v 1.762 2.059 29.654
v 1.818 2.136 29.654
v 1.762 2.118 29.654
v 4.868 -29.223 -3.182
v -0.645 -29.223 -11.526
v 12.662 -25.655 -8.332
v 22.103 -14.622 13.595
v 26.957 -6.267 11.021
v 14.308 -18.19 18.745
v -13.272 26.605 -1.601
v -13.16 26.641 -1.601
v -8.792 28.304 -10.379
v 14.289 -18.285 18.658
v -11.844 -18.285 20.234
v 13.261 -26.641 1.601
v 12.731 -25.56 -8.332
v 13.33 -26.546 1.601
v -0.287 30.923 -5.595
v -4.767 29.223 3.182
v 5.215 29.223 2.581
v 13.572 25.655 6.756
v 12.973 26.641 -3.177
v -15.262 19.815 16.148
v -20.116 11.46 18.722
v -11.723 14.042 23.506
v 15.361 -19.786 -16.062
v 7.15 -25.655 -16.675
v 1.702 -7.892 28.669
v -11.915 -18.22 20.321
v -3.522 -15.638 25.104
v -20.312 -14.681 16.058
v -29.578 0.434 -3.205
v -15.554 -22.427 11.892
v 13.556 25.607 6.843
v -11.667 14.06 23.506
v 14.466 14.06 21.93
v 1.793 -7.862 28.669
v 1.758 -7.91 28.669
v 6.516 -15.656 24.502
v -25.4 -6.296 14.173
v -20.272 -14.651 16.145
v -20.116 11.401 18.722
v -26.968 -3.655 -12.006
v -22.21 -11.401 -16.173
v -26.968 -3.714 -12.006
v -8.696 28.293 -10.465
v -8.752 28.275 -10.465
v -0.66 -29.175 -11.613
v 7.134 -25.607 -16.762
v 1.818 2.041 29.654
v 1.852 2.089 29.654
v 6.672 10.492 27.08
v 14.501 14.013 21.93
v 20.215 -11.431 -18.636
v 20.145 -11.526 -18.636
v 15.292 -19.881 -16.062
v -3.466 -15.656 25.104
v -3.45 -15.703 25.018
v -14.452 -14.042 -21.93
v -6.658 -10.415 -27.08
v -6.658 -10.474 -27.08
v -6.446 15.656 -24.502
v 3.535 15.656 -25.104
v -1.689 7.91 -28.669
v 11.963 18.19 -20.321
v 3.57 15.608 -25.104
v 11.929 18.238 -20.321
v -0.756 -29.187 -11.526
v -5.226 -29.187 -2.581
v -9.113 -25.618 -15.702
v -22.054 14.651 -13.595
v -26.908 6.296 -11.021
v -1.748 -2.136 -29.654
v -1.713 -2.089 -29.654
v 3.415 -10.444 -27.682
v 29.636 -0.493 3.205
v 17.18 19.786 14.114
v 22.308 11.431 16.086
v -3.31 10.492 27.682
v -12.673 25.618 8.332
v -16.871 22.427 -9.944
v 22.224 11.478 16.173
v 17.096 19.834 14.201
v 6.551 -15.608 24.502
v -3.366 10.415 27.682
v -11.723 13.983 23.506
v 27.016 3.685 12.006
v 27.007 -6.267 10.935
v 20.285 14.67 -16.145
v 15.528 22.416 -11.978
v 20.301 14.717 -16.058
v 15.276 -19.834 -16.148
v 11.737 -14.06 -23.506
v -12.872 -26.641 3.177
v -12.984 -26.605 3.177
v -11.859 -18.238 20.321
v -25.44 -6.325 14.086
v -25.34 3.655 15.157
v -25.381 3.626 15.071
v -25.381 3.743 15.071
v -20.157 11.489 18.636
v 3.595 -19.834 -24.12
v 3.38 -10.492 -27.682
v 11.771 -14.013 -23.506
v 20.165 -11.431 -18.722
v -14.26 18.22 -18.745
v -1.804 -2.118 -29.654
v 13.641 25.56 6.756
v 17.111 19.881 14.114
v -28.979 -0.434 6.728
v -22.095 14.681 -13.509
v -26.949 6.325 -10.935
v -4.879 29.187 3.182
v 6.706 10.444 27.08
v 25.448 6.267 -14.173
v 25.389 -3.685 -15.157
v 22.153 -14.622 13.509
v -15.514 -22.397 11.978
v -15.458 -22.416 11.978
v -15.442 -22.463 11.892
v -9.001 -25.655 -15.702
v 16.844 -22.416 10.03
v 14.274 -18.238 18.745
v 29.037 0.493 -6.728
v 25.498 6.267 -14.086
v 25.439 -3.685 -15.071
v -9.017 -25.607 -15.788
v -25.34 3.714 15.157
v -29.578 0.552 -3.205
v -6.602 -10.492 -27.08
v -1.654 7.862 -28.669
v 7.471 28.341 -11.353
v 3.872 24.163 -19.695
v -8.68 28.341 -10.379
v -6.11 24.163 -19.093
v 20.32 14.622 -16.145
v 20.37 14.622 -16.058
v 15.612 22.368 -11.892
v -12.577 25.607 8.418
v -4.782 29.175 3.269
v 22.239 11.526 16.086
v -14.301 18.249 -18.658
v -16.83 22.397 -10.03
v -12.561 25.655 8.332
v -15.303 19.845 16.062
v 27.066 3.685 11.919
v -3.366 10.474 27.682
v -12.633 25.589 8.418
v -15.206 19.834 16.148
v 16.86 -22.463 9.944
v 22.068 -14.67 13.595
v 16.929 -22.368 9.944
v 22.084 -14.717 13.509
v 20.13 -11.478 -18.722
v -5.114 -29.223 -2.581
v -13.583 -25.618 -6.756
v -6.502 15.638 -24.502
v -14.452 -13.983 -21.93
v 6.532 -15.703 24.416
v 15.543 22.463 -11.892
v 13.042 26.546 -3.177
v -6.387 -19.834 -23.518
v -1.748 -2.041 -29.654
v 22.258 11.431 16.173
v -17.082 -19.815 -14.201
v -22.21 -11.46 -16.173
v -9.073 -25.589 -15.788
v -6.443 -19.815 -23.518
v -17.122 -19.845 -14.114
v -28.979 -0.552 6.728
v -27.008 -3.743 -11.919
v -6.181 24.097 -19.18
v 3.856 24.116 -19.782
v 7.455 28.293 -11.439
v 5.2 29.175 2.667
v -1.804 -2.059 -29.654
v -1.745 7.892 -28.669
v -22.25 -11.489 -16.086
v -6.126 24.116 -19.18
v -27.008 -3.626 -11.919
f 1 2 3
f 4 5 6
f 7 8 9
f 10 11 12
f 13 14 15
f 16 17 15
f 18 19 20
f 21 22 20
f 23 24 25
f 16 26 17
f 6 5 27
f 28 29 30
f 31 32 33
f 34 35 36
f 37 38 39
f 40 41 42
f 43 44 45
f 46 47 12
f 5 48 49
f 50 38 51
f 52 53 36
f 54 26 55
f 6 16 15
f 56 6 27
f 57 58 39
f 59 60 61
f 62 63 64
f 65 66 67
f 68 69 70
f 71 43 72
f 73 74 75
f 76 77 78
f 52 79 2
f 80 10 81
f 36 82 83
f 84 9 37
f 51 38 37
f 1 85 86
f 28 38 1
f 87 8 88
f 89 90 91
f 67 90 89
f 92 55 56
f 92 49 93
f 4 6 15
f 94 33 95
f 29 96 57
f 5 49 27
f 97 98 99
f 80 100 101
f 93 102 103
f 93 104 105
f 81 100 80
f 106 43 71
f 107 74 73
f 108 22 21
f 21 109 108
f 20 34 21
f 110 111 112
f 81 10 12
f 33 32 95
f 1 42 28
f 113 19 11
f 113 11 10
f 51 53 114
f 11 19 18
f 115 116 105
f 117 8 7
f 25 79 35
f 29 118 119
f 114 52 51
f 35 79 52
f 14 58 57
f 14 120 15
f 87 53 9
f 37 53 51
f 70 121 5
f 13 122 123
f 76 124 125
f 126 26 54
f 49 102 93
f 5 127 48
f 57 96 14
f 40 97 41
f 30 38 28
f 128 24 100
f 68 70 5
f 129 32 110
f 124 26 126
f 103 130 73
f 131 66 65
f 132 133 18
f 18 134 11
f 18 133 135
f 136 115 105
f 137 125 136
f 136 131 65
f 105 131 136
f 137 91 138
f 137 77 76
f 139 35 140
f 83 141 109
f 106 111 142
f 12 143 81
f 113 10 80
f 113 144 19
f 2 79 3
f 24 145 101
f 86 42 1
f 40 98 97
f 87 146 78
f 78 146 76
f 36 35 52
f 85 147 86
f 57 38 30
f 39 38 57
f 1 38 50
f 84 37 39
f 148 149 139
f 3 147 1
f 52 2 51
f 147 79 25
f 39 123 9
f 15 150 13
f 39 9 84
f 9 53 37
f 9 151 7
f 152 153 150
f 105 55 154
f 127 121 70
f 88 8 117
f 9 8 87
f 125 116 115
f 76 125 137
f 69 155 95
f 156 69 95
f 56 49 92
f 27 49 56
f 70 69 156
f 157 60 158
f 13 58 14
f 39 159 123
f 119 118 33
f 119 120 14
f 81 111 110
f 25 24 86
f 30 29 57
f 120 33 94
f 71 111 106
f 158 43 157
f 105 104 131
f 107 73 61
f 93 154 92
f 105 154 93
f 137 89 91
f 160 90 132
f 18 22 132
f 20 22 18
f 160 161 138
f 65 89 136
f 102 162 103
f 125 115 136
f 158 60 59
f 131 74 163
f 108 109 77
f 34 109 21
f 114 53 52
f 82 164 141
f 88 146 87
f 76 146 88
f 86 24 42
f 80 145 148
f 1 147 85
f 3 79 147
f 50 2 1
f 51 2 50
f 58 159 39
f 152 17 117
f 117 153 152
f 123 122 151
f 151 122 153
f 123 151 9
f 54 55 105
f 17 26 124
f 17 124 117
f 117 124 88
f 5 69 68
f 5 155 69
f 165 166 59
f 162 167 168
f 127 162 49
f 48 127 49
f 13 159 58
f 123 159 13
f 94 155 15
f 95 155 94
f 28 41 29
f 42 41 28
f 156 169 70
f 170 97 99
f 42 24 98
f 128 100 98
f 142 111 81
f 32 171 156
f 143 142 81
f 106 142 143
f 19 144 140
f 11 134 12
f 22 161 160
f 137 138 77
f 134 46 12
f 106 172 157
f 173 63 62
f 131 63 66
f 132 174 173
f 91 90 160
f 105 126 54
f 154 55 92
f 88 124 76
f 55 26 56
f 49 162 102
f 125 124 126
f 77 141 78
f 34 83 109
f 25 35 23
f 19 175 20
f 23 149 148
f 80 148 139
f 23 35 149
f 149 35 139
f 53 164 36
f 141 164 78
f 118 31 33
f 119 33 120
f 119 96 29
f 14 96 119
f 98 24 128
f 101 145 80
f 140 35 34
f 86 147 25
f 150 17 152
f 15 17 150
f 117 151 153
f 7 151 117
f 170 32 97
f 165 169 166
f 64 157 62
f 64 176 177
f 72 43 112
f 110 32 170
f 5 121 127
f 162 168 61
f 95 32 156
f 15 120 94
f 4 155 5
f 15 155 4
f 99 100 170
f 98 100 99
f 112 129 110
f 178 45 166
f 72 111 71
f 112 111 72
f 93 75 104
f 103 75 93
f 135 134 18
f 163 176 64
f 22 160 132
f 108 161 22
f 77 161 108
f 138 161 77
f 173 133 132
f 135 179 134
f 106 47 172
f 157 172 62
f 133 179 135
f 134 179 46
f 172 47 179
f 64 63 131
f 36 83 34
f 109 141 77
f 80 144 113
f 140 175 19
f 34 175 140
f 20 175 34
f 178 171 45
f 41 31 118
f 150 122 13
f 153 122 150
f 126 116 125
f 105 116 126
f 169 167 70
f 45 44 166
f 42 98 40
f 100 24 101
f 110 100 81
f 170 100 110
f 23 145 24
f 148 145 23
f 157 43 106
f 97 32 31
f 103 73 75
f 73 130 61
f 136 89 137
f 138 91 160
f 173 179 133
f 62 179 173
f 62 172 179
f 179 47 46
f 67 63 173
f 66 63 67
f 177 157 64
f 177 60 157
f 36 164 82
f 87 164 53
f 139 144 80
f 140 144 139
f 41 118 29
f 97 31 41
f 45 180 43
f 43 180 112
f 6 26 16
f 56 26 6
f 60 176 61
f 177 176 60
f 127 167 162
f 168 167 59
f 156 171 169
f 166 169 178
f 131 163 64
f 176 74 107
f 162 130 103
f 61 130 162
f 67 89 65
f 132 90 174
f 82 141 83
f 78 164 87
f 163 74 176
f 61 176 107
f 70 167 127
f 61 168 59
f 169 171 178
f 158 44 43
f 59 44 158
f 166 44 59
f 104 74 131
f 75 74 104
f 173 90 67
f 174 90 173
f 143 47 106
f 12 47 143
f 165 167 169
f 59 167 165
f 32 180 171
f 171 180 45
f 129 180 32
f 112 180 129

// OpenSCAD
// Auto-generated OpenSCAD file

    inner_points = 10*[[-0.17041080214674126, 0.7862375594247885, -2.8582778861302787], [0.1802309286658651, 0.2088872902636722, 2.9567222750529307], [-0.17634695174386278, -0.20888728923371336, -2.9567222750529307], [0.17429477906874358, -0.7862375583948297, 2.8582778861302787], [-2.9497504156068732, 0.04931160049722948, -0.3204805387029167], [-2.889853657259625, -0.04931159952382933, 0.6728400755788456], [2.893737634181627, 0.04931160055378816, -0.6728400755788456], [2.9536343925288753, -0.04931159946727065, 0.3204805387029167], [-0.47977606233285736, 2.9127811671079766, 0.3182468427064288], [-0.5145268873613189, -2.9127811660876786, -0.25805664805191697], [0.5184108642833212, 2.912781167117638, 0.25805664805191697], [0.48366003925485973, -2.9127811660780174, -0.3182468427064288], [-0.6461927033123381, 1.5608342286633365, -2.4415866544877143], [-0.3325692049742699, 1.044436449194514, 2.7595076053434417], [-0.6617337447199062, -1.0444364481742165, -2.69931741068893], [-0.3481102463818381, -1.5608342276430391, 2.501776849142226], [0.35199422330384045, 1.560834228672998, -2.501776849142226], [0.6656177216419085, 1.0444364492041753, 2.69931741068893], [0.33645318189627227, -1.0444364481645552, -2.7595076053434417], [0.6500766802343404, -1.5608342276333778, 2.4415866544877143], [-2.6867831123319075, 0.6266618696861422, -1.0934713951014787], [-2.5299713631628737, 0.3684629799517309, 1.5070757348140993], [-2.692719261929029, -0.3684629789723597, -1.1919157840241308], [-2.5359075127599953, -0.6266618687067711, 1.4086313458914472], [2.5397914896819973, 0.6266618697367299, -1.4086313458914472], [2.696603238851031, 0.3684629800023185, 1.1919157840241308], [2.533855340084876, -0.3684629789217721, -1.5070757348140993], [2.6906670892539095, -0.6266618686561835, 1.0934713951014787], [-1.3191089998085306, 2.654582277350415, -0.16013956324217252], [-1.2592122414612827, 2.5559590773293563, 0.8331810510395898], [-1.3501910826236672, -2.555959076324691, -0.6756010756446058], [-1.2902943242764193, -2.6545822763457494, 0.31771953863715663], [1.2941783011984218, 2.6545822773757086, -0.31771953863715663], [1.3540750595456696, 2.5559590773546503, 0.6756010756446058], [1.2630962183832852, -2.555959076299397, -0.8331810510395898], [1.322992976730533, -2.654582276320456, 0.16013956324217252], [-1.4219601402274384, 1.8190331184052655, -1.8658104677986405], [-1.1682334002366181, 1.4012585389575019, 2.341963177750754], [-1.4411699238483318, -1.4012585379528368, -2.1843832023557694], [-1.1874431838575115, -1.8190331174006005, 2.0233904431936245], [1.191327160779514, 1.8190331184305593, -2.0233904431936245], [1.4450539007703342, 1.4012585389827956, 2.1843832023557694], [1.1721173771586206, -1.401258537927543, -2.341963177750754], [1.425844117149441, -1.8190331173753067, 1.8658104677986405], [-2.201396319355864, 1.4622110286266452, -1.350876259465479], [-2.0075663377122916, 1.1430596491999403, 1.8635767718021523], [-2.216937360763432, -1.1430596482109077, -1.6086070156666958], [-2.02310737911986, -1.4622110276376128, 1.6058460156009355], [2.026991356041862, 1.4622110286675716, -1.6058460156009355], [2.220821337685434, 1.1430596492408664, 1.6086070156666958], [2.0114503146342937, -1.1430596481699815, -1.8635767718021523], [2.205280296277866, -1.4622110275966864, 1.350876259465479], [-1.6789912939052822, 2.236807697874855, -0.9943752224774262], [-1.5221795447362483, 1.9786088081404438, 1.606171907438152], [-1.704137227123297, -1.9786088071417498, -1.411392345957207], [-1.5473254779542631, -2.2368076968761605, 1.189154783958371], [1.5512094548762656, 2.2368076979061198, -1.189154783958371], [1.7080212040452996, 1.9786088081717086, 1.411392345957207], [1.5260635216582508, -1.978608807110485, -1.606171907438152], [1.6828752708272847, -2.2368076968448958, 0.9943752224774262], [-0.8711277587214085, 2.8245698953316367, -1.0378735875155352], [-0.9032238569451155, -2.5559590763240982, -1.5701514091469855], [0.7439726156693655, 2.8245698953472695, -1.1352633682560076], [0.7118765174456584, -2.555959076308466, -1.667541189887458], [-0.6140966050435644, 2.4067953158620474, -1.9093088328367496], [-0.6402565536701501, -1.9786088071351857, -2.343142265545548], [0.38409032157261397, 2.406795315871709, -1.9694990274912612], [0.35793037294602836, -1.9786088071255243, -2.4033324602000596], [-0.03179482124573489, 3.0827687850891983, -0.5594871815669338], [-0.06755966168276713, -2.9127811660870866, -1.1526069815542968]];

    outer_points = 10*[[0.02669300107192015, 2.6559559407120075, -1.327709675532447], [-0.042901108049307975, -2.064522788314904, 2.1339007964918846], [0.042901108049307975, 2.064522788314904, -2.1339007964918846], [-0.02669300107192015, -2.6559559407120075, 1.327709675532447], [-2.9205155693857976, 0.40317701641016973, -0.35449197483984196], [-2.932403662473765, -0.40317701641016973, 0.2368216872694541], [2.932403662473765, 0.40317701641016973, -0.2368216872694541], [2.9205155693857976, -0.40317701641016973, 0.35449197483984196], [-0.5473409378859402, 1.731154990176565, 2.349712270792537], [-0.4524570269604289, -1.731154990176565, -2.3698127555891437], [0.4524570269604289, 1.731154990176565, 2.3698127555891437], [0.5473409378859402, -1.731154990176565, -2.349712270792537], [-0.4899922381375115, 2.885258312413753, -0.5028116297625187], [-0.5522391016689532, -1.3368662173646406, 2.593346901066097], [-0.4475588631774159, 1.3368662173646406, -2.613447385862704], [-0.5098057267088576, -2.885258312413753, 0.48271114496591183], [0.5098057267088576, 2.885258312413753, -0.48271114496591183], [0.4475588631774159, -1.3368662173646406, 2.613447385862704], [0.5522391016689532, 1.3368662173646406, -2.593346901066097], [0.4899922381375115, -2.885258312413753, 0.5028116297625187], [-2.6100473914566003, 1.3512477086431498, -0.4235678246153023], [-2.641170823222321, -0.7598145562460469, 1.1245114407990056], [-2.5938392844792126, 0.7598145562460469, -1.22975894557474], [-2.6249627162449336, -1.3512477086431498, 0.318320319839568], [2.6249627162449336, 1.3512477086431498, -0.318320319839568], [2.5938392844792126, -0.7598145562460469, 1.22975894557474], [2.641170823222321, 0.7598145562460469, -1.1245114407990056], [2.6100473914566003, -1.3512477086431498, 0.4235678246153023], [-1.3452418553414955, 1.951569111459282, 1.7886670488516037], [-1.3571299484294628, 1.1452150786389423, 2.3799807109609], [-1.2603751054213042, -1.1452150786389423, -2.4326044633487673], [-1.2722631985092714, -1.951569111459282, -1.8412908012394709], [1.2722631985092714, 1.951569111459282, 1.8412908012394709], [1.2603751054213042, 1.1452150786389423, 2.4326044633487673], [1.3571299484294628, -1.1452150786389423, -2.3799807109609], [1.3452418553414955, -1.951569111459282, -1.7886670488516037], [-1.309798409686354, 2.6648441911310363, 0.025710324587154474], [-1.3601571801298284, -0.7509263058270181, 2.530555193306474], [-1.2573478737209385, 0.7509263058270181, -2.5831789456943413], [-1.307706644164413, -2.6648441911310363, -0.07833407697502164], [1.307706644164413, 2.6648441911310363, 0.07833407697502164], [1.2573478737209385, -0.7509263058270181, 2.5831789456943413], [1.3601571801298284, 0.7509263058270181, -2.530555193306474], [1.309798409686354, -2.6648441911310363, -0.025710324587154474], [-2.119587420229877, 2.0789042795934134, 0.05597876475551708], [-2.158058097585384, -0.5305121845443014, 1.969509971365541], [-2.077154045269781, 0.5305121845443014, -2.0546569913446686], [-2.115624722625288, -2.0789042795934134, -0.14112578473464457], [2.115624722625288, 2.0789042795934134, 0.14112578473464457], [2.077154045269781, -0.5305121845443014, 2.0546569913446686], [2.158058097585384, 0.5305121845443014, -1.969509971365541], [2.119587420229877, -2.0789042795934134, -0.05597876475551708], [-1.6364746945929391, 2.308206651295159, 0.9009772953220524], [-1.6675981263586601, 0.1971443864059621, 2.44905656073636], [-1.5678160516501356, -0.1971443864059621, -2.5141030959188813], [-1.5989394834158566, -2.308206651295159, -0.9660238305045731], [1.5989394834158566, 2.308206651295159, 0.9660238305045731], [1.5678160516501356, 0.1971443864059621, 2.5141030959188813], [1.6675981263586601, -0.1971443864059621, -2.44905656073636], [1.6364746945929391, -2.308206651295159, -0.9009772953220524], [-0.8364820114928158, 2.697002179477167, 1.3579781096013481], [-0.7488465863649101, -0.5008108542945804, -3.0010072869159212], [0.7812250775115821, 2.697002179477167, 1.3905013771926082], [0.8688605026394878, -0.5008108542945804, -2.9684840193246607], [-0.5098057265862307, 3.0536397193130442, 0.48271113886644995], [-0.43837840843571274, 0.4472598379384001, -3.0700831366913817], [0.48999223826013844, 3.0536397193130442, 0.5028116236630568], [0.5614195564106563, 0.4472598379384001, -3.049982651894775], [-0.03858109403726045, 2.4765880581944497, 1.9190233315422813], [0.05907149209596527, -1.0867507658322033, -2.938215579156298]];

    // Convex hull for inner set (I)
    module inner_hull() {
        hull() {
            for (p = inner_points) {
                translate(p) sphere(r=0.1);
            }
        }
    }

    // Convex hull for outer set (O) minus inner hull (O \ I)
    module outer_minus_inner() {
        difference() {
            hull() {
                for (p = outer_points) {
                    translate(p) sphere(r=0.1);
                }
            }
            inner_hull(); // Subtract inner hull
        }
    }

    // Convex hull for outer set (O) minus all translated inner hulls
    module outer_minus_AllTranslationInner() {
        difference() {
            hull() {
                for (p = outer_points) {
                    translate(p) sphere(r=0.1);
                }
            }
            hull() {
                translate([0,0,50]) inner_hull();
                translate([0,0,-50]) inner_hull();
            }; // Subtract translated inner hulls
        }
    }

    // Difference between outer_minus_inner and outer_minus_AllTranslationInner
    module outer_minus_inner_diff() {
        difference() {
            // Outer minus inner
            difference() {
                hull() {
                    for (p = outer_points) {
                        translate(p) sphere(r=0.1);
                    }
                }
                inner_hull();
            }

            // Subtract Outer minus AllTranslationInner
            difference() {
                hull() {
                    for (p = outer_points) {
                        translate(p) sphere(r=0.1);
                    }
                }
                hull() {
                    translate([0,0,50]) inner_hull();
                    translate([0,0,-50]) inner_hull();
                };
            }
        }
    }

    // Rendering all with colors applied
    color([1, 0, 0, 0.5]) inner_hull(); // Transparent red
    
